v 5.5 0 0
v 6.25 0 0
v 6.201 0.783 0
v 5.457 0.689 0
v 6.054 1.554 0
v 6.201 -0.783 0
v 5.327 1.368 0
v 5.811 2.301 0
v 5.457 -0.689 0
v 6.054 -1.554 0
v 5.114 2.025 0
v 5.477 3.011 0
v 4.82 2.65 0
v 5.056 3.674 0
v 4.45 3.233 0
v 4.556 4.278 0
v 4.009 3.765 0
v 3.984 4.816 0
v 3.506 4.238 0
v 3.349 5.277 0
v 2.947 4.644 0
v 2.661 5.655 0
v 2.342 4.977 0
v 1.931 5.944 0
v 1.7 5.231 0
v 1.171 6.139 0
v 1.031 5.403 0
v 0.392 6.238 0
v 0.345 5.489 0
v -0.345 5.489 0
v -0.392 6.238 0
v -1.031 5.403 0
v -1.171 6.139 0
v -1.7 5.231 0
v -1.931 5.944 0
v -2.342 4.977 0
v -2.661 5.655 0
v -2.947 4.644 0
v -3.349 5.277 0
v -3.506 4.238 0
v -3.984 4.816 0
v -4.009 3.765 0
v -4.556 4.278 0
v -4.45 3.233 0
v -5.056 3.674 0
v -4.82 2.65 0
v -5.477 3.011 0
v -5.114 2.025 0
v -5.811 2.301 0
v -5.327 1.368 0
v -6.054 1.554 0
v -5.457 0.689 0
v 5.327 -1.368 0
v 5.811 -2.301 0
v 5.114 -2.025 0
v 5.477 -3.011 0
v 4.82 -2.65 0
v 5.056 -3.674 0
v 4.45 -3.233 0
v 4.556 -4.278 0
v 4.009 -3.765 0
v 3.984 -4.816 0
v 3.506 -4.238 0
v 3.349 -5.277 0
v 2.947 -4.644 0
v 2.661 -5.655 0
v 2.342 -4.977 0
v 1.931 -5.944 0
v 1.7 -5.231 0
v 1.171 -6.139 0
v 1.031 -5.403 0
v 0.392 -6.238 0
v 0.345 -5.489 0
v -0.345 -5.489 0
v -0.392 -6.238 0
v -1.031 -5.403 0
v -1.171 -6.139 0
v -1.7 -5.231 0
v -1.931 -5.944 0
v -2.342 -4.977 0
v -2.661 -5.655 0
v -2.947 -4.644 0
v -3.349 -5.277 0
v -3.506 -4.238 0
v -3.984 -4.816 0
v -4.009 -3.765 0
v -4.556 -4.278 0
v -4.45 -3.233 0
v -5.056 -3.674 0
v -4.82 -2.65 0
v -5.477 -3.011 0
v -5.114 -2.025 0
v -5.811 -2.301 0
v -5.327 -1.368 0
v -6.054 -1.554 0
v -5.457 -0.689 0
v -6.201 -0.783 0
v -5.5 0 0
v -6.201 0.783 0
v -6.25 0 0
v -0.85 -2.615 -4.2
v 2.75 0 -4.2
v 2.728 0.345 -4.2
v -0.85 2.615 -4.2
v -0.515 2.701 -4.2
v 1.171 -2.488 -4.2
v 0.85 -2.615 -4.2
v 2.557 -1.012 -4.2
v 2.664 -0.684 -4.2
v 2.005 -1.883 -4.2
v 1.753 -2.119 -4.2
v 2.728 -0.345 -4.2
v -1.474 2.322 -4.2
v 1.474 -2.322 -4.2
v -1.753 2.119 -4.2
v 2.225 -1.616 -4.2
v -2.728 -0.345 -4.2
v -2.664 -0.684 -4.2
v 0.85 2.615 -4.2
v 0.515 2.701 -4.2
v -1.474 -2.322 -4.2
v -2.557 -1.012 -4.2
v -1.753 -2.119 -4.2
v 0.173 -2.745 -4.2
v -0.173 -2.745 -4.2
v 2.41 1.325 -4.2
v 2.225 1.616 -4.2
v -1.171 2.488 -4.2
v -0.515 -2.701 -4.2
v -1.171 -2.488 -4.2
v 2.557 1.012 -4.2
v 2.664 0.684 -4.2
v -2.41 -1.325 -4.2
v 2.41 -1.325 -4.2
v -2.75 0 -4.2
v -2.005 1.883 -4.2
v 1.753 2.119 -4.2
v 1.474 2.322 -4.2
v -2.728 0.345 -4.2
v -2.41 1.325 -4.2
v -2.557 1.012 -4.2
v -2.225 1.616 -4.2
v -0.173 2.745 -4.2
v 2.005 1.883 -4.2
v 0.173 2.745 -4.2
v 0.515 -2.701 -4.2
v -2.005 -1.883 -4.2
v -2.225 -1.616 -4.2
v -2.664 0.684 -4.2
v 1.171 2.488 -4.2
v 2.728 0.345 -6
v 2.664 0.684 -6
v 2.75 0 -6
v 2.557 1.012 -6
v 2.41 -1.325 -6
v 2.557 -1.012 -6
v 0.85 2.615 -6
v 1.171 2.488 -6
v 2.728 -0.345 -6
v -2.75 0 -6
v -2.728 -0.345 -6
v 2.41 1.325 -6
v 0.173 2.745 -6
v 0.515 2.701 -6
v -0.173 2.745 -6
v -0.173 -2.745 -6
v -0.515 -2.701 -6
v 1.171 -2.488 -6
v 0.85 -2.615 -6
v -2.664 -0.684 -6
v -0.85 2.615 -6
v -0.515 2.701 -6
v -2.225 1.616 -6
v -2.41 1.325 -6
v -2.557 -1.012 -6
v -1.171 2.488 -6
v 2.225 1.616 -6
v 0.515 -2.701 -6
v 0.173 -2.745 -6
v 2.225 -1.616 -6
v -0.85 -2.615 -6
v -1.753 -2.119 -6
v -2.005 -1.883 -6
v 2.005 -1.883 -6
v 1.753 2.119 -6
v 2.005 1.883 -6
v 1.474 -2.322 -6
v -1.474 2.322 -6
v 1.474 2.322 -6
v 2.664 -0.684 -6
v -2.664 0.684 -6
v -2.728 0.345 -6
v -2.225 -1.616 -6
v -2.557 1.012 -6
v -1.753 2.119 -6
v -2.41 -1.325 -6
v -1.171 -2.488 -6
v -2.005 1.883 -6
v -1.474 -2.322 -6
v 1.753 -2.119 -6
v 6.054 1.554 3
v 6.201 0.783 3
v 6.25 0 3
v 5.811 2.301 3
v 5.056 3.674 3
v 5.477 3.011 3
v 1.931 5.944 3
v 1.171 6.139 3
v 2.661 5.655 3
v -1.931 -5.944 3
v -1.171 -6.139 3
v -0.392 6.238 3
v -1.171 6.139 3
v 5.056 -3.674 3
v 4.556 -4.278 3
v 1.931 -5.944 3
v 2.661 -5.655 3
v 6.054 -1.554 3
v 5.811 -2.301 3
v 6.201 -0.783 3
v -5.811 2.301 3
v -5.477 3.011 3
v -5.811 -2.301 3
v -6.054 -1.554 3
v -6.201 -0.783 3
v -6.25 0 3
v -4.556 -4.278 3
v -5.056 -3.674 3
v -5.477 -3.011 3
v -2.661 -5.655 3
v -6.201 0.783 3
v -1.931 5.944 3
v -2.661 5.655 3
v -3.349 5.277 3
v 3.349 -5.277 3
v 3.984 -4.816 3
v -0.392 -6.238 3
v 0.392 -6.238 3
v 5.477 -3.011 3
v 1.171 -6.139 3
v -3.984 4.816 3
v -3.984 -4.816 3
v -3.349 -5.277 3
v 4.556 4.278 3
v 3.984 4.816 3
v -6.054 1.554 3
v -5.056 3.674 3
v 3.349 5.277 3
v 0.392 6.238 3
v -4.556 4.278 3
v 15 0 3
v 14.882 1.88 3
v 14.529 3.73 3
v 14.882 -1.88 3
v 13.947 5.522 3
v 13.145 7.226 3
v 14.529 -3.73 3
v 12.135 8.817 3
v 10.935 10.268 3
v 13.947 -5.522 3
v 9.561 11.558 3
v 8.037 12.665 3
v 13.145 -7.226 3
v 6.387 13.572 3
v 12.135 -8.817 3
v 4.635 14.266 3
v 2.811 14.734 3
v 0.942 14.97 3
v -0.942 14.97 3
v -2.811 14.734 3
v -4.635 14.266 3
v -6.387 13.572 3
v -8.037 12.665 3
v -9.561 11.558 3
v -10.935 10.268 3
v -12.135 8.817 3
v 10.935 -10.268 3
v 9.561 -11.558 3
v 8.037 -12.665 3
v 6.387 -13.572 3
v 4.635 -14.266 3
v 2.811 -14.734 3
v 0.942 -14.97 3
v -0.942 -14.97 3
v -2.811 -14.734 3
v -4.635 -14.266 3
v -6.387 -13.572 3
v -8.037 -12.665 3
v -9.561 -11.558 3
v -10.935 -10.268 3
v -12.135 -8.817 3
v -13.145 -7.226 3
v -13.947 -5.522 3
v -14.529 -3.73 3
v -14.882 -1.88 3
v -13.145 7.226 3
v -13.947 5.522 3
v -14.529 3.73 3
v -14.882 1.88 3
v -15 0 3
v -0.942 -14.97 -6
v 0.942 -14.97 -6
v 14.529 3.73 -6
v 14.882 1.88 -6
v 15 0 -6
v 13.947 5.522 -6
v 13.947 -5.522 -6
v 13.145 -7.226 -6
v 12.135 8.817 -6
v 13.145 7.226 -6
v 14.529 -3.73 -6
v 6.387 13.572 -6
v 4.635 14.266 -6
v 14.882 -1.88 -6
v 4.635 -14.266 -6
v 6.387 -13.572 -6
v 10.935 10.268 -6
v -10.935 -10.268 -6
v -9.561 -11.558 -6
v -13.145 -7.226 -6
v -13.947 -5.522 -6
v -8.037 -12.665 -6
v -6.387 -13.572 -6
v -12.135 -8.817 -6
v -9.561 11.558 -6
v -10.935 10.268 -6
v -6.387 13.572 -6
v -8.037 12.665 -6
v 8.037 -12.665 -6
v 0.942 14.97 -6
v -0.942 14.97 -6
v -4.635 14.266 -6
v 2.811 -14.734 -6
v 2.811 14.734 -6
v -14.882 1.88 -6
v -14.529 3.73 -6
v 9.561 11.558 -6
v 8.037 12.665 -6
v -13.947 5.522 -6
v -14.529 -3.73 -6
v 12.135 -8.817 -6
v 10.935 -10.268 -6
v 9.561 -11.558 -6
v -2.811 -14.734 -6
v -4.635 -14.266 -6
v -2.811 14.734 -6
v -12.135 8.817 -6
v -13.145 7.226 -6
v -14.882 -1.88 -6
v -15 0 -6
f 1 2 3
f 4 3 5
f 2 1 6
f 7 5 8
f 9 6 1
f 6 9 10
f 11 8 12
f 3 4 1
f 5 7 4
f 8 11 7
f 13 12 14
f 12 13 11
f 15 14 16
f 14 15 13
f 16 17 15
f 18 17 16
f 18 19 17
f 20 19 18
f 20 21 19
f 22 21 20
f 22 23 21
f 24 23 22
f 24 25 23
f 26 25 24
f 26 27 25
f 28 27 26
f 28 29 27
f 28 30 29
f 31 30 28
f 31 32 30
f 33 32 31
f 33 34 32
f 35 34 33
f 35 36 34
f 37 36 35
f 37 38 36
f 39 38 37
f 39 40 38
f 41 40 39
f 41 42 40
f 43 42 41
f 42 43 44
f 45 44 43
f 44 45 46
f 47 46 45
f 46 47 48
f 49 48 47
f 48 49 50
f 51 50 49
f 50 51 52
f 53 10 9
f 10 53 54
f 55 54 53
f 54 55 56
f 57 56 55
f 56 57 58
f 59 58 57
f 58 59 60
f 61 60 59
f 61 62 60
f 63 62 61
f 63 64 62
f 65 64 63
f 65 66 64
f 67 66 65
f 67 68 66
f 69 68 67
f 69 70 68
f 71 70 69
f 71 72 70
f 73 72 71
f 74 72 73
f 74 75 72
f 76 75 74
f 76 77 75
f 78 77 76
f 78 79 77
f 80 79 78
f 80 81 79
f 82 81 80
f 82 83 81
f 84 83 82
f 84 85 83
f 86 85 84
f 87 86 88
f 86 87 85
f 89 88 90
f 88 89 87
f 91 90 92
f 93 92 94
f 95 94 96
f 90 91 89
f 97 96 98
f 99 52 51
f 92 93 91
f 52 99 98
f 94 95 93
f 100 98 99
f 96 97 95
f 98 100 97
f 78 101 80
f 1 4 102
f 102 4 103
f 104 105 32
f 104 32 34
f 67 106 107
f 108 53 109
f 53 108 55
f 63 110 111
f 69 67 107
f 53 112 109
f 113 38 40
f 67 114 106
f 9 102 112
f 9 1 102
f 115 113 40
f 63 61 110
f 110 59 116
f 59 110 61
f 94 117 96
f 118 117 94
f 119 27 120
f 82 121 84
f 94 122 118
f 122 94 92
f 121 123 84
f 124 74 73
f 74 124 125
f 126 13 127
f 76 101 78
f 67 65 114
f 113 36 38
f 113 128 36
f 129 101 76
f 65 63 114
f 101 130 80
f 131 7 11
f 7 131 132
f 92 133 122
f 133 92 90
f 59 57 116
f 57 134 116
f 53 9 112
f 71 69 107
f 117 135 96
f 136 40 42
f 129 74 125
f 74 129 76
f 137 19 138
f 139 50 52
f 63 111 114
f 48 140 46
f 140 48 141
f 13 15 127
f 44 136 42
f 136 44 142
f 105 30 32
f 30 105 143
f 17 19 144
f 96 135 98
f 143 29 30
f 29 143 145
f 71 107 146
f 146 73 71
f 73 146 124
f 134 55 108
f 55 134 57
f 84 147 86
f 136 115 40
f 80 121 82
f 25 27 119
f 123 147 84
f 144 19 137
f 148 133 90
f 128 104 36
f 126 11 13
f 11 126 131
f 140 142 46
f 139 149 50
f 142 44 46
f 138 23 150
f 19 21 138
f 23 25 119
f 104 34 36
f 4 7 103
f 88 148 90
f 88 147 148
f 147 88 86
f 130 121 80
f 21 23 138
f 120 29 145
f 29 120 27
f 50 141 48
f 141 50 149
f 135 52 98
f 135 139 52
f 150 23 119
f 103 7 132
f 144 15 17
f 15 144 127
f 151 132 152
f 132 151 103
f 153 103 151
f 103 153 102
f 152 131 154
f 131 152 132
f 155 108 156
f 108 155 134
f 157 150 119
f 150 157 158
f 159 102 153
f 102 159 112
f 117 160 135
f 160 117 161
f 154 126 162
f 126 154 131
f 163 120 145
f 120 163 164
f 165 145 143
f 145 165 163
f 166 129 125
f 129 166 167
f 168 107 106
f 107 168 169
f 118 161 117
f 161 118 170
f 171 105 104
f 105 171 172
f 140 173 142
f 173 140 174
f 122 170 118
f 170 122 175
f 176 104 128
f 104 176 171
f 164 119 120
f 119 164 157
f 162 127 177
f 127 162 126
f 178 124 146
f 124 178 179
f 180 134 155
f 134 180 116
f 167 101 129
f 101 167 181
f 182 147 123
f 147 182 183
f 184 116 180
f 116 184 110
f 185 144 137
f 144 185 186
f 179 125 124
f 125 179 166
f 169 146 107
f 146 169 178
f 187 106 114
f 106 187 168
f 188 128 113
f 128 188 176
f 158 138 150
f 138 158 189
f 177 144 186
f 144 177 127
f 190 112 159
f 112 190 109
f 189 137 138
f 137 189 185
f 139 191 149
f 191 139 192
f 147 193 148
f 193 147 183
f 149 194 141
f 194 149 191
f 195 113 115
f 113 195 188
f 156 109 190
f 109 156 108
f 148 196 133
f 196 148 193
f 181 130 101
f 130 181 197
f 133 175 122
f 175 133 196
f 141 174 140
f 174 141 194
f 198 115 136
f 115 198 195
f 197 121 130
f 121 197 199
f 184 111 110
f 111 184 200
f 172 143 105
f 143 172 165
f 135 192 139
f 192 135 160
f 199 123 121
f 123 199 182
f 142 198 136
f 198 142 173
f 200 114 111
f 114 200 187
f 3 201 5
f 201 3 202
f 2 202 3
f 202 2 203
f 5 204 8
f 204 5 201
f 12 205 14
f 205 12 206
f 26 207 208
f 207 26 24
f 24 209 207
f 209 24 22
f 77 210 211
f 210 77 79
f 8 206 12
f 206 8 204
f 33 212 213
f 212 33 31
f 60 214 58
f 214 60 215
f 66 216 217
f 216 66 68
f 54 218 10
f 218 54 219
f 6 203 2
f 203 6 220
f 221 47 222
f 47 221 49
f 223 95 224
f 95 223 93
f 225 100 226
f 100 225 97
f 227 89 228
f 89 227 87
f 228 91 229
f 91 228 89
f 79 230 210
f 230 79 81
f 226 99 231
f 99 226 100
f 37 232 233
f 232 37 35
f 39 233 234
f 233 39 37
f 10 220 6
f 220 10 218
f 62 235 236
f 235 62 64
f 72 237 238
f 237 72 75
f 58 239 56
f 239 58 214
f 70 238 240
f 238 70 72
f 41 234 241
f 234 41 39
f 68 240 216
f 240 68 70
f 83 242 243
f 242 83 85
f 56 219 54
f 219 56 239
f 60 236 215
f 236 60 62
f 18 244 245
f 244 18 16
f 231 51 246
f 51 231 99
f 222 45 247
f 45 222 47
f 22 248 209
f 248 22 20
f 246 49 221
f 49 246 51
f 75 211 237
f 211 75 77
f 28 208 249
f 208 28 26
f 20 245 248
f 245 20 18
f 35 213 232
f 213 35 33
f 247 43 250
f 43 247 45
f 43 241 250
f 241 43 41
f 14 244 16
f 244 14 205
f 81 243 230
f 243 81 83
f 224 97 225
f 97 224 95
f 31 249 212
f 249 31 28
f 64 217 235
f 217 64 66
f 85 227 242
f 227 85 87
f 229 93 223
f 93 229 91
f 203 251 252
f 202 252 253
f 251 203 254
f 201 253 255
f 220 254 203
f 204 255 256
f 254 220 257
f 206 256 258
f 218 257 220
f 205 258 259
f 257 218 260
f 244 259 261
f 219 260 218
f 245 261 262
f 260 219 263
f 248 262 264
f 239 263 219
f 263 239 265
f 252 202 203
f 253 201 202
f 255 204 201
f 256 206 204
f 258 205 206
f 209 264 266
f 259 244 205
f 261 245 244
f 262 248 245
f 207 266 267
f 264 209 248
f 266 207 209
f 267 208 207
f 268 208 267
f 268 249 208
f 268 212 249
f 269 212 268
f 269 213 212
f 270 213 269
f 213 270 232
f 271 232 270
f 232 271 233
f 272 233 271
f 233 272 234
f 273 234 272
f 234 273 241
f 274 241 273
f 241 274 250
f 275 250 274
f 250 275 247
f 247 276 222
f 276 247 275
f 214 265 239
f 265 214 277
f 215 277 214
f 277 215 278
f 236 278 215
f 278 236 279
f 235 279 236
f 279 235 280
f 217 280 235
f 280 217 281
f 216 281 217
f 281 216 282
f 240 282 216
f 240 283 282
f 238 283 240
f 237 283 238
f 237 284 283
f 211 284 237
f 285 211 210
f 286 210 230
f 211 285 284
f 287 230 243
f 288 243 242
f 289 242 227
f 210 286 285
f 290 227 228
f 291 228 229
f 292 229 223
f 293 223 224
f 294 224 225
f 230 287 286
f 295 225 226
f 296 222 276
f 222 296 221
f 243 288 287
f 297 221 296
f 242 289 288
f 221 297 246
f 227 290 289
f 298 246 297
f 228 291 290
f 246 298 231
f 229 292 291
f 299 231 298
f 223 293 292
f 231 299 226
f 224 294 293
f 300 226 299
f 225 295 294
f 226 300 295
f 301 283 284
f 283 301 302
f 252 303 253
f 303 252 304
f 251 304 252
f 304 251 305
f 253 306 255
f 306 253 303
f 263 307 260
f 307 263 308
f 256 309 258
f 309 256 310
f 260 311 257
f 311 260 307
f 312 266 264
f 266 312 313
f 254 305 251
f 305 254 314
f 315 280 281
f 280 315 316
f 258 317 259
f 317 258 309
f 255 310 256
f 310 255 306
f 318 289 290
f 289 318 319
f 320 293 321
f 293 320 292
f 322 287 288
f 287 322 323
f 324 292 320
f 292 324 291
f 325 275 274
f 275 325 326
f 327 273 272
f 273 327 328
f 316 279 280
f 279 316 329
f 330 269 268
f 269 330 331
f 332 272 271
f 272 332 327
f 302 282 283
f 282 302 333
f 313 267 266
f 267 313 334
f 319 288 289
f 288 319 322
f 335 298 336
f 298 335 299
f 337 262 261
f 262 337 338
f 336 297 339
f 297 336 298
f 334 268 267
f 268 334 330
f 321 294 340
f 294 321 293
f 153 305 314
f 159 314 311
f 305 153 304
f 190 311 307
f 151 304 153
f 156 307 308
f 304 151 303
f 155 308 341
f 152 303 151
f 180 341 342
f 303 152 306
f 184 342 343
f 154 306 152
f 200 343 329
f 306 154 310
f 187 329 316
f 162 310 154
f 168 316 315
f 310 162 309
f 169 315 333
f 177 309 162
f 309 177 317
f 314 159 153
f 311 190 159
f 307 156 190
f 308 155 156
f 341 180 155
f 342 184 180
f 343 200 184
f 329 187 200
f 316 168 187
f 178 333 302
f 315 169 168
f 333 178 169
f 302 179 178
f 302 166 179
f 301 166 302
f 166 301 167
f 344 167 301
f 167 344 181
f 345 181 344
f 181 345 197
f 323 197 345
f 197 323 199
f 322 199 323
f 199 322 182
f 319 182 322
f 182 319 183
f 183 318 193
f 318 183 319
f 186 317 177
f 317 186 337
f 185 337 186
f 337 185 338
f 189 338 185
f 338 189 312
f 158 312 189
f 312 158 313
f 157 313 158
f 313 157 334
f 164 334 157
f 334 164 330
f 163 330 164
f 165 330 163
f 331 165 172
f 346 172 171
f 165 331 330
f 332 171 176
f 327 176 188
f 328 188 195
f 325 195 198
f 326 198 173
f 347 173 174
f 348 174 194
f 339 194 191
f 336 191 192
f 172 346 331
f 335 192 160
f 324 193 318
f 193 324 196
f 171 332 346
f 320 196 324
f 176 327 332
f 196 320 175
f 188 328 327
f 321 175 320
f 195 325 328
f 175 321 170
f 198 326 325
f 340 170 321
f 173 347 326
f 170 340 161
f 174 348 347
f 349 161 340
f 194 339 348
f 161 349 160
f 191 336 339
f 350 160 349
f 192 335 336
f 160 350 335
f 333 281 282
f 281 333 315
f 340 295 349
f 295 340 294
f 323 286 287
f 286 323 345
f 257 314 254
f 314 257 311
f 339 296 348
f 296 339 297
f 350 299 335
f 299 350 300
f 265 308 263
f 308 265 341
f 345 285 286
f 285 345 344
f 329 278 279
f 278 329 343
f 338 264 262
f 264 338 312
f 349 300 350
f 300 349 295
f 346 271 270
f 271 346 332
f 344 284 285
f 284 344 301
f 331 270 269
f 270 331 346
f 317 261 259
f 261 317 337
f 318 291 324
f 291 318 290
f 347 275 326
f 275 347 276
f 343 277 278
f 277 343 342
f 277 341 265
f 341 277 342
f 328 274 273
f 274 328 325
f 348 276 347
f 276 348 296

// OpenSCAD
$fn = 50;

difference() {
	union() {
		translate(v = [0, 0, -6.0]) {
			cylinder(h = 9, r = 15.0);
		}
	}
	union() {
		translate(v = [0, 0, 0]) {
			rotate(a = [0, 0, 0]) {
				difference() {
					union() {
						translate(v = [0, 0, -9.0]) {
							cylinder(h = 9, r = 2.25);
						}
						translate(v = [0, 0, -4.2]) {
							cylinder(h = 4.2, r1 = 2.75, r2 = 5.5);
						}
						translate(v = [0, 0, -9.0]) {
							cylinder(h = 9, r = 2.75);
						}
						translate(v = [0, 0, -9.0]) {
							cylinder(h = 9, r = 2.25);
						}
					}
					union();
				}
			}
		}
		#cylinder(h = 3, r = 6.25);
	}
}
